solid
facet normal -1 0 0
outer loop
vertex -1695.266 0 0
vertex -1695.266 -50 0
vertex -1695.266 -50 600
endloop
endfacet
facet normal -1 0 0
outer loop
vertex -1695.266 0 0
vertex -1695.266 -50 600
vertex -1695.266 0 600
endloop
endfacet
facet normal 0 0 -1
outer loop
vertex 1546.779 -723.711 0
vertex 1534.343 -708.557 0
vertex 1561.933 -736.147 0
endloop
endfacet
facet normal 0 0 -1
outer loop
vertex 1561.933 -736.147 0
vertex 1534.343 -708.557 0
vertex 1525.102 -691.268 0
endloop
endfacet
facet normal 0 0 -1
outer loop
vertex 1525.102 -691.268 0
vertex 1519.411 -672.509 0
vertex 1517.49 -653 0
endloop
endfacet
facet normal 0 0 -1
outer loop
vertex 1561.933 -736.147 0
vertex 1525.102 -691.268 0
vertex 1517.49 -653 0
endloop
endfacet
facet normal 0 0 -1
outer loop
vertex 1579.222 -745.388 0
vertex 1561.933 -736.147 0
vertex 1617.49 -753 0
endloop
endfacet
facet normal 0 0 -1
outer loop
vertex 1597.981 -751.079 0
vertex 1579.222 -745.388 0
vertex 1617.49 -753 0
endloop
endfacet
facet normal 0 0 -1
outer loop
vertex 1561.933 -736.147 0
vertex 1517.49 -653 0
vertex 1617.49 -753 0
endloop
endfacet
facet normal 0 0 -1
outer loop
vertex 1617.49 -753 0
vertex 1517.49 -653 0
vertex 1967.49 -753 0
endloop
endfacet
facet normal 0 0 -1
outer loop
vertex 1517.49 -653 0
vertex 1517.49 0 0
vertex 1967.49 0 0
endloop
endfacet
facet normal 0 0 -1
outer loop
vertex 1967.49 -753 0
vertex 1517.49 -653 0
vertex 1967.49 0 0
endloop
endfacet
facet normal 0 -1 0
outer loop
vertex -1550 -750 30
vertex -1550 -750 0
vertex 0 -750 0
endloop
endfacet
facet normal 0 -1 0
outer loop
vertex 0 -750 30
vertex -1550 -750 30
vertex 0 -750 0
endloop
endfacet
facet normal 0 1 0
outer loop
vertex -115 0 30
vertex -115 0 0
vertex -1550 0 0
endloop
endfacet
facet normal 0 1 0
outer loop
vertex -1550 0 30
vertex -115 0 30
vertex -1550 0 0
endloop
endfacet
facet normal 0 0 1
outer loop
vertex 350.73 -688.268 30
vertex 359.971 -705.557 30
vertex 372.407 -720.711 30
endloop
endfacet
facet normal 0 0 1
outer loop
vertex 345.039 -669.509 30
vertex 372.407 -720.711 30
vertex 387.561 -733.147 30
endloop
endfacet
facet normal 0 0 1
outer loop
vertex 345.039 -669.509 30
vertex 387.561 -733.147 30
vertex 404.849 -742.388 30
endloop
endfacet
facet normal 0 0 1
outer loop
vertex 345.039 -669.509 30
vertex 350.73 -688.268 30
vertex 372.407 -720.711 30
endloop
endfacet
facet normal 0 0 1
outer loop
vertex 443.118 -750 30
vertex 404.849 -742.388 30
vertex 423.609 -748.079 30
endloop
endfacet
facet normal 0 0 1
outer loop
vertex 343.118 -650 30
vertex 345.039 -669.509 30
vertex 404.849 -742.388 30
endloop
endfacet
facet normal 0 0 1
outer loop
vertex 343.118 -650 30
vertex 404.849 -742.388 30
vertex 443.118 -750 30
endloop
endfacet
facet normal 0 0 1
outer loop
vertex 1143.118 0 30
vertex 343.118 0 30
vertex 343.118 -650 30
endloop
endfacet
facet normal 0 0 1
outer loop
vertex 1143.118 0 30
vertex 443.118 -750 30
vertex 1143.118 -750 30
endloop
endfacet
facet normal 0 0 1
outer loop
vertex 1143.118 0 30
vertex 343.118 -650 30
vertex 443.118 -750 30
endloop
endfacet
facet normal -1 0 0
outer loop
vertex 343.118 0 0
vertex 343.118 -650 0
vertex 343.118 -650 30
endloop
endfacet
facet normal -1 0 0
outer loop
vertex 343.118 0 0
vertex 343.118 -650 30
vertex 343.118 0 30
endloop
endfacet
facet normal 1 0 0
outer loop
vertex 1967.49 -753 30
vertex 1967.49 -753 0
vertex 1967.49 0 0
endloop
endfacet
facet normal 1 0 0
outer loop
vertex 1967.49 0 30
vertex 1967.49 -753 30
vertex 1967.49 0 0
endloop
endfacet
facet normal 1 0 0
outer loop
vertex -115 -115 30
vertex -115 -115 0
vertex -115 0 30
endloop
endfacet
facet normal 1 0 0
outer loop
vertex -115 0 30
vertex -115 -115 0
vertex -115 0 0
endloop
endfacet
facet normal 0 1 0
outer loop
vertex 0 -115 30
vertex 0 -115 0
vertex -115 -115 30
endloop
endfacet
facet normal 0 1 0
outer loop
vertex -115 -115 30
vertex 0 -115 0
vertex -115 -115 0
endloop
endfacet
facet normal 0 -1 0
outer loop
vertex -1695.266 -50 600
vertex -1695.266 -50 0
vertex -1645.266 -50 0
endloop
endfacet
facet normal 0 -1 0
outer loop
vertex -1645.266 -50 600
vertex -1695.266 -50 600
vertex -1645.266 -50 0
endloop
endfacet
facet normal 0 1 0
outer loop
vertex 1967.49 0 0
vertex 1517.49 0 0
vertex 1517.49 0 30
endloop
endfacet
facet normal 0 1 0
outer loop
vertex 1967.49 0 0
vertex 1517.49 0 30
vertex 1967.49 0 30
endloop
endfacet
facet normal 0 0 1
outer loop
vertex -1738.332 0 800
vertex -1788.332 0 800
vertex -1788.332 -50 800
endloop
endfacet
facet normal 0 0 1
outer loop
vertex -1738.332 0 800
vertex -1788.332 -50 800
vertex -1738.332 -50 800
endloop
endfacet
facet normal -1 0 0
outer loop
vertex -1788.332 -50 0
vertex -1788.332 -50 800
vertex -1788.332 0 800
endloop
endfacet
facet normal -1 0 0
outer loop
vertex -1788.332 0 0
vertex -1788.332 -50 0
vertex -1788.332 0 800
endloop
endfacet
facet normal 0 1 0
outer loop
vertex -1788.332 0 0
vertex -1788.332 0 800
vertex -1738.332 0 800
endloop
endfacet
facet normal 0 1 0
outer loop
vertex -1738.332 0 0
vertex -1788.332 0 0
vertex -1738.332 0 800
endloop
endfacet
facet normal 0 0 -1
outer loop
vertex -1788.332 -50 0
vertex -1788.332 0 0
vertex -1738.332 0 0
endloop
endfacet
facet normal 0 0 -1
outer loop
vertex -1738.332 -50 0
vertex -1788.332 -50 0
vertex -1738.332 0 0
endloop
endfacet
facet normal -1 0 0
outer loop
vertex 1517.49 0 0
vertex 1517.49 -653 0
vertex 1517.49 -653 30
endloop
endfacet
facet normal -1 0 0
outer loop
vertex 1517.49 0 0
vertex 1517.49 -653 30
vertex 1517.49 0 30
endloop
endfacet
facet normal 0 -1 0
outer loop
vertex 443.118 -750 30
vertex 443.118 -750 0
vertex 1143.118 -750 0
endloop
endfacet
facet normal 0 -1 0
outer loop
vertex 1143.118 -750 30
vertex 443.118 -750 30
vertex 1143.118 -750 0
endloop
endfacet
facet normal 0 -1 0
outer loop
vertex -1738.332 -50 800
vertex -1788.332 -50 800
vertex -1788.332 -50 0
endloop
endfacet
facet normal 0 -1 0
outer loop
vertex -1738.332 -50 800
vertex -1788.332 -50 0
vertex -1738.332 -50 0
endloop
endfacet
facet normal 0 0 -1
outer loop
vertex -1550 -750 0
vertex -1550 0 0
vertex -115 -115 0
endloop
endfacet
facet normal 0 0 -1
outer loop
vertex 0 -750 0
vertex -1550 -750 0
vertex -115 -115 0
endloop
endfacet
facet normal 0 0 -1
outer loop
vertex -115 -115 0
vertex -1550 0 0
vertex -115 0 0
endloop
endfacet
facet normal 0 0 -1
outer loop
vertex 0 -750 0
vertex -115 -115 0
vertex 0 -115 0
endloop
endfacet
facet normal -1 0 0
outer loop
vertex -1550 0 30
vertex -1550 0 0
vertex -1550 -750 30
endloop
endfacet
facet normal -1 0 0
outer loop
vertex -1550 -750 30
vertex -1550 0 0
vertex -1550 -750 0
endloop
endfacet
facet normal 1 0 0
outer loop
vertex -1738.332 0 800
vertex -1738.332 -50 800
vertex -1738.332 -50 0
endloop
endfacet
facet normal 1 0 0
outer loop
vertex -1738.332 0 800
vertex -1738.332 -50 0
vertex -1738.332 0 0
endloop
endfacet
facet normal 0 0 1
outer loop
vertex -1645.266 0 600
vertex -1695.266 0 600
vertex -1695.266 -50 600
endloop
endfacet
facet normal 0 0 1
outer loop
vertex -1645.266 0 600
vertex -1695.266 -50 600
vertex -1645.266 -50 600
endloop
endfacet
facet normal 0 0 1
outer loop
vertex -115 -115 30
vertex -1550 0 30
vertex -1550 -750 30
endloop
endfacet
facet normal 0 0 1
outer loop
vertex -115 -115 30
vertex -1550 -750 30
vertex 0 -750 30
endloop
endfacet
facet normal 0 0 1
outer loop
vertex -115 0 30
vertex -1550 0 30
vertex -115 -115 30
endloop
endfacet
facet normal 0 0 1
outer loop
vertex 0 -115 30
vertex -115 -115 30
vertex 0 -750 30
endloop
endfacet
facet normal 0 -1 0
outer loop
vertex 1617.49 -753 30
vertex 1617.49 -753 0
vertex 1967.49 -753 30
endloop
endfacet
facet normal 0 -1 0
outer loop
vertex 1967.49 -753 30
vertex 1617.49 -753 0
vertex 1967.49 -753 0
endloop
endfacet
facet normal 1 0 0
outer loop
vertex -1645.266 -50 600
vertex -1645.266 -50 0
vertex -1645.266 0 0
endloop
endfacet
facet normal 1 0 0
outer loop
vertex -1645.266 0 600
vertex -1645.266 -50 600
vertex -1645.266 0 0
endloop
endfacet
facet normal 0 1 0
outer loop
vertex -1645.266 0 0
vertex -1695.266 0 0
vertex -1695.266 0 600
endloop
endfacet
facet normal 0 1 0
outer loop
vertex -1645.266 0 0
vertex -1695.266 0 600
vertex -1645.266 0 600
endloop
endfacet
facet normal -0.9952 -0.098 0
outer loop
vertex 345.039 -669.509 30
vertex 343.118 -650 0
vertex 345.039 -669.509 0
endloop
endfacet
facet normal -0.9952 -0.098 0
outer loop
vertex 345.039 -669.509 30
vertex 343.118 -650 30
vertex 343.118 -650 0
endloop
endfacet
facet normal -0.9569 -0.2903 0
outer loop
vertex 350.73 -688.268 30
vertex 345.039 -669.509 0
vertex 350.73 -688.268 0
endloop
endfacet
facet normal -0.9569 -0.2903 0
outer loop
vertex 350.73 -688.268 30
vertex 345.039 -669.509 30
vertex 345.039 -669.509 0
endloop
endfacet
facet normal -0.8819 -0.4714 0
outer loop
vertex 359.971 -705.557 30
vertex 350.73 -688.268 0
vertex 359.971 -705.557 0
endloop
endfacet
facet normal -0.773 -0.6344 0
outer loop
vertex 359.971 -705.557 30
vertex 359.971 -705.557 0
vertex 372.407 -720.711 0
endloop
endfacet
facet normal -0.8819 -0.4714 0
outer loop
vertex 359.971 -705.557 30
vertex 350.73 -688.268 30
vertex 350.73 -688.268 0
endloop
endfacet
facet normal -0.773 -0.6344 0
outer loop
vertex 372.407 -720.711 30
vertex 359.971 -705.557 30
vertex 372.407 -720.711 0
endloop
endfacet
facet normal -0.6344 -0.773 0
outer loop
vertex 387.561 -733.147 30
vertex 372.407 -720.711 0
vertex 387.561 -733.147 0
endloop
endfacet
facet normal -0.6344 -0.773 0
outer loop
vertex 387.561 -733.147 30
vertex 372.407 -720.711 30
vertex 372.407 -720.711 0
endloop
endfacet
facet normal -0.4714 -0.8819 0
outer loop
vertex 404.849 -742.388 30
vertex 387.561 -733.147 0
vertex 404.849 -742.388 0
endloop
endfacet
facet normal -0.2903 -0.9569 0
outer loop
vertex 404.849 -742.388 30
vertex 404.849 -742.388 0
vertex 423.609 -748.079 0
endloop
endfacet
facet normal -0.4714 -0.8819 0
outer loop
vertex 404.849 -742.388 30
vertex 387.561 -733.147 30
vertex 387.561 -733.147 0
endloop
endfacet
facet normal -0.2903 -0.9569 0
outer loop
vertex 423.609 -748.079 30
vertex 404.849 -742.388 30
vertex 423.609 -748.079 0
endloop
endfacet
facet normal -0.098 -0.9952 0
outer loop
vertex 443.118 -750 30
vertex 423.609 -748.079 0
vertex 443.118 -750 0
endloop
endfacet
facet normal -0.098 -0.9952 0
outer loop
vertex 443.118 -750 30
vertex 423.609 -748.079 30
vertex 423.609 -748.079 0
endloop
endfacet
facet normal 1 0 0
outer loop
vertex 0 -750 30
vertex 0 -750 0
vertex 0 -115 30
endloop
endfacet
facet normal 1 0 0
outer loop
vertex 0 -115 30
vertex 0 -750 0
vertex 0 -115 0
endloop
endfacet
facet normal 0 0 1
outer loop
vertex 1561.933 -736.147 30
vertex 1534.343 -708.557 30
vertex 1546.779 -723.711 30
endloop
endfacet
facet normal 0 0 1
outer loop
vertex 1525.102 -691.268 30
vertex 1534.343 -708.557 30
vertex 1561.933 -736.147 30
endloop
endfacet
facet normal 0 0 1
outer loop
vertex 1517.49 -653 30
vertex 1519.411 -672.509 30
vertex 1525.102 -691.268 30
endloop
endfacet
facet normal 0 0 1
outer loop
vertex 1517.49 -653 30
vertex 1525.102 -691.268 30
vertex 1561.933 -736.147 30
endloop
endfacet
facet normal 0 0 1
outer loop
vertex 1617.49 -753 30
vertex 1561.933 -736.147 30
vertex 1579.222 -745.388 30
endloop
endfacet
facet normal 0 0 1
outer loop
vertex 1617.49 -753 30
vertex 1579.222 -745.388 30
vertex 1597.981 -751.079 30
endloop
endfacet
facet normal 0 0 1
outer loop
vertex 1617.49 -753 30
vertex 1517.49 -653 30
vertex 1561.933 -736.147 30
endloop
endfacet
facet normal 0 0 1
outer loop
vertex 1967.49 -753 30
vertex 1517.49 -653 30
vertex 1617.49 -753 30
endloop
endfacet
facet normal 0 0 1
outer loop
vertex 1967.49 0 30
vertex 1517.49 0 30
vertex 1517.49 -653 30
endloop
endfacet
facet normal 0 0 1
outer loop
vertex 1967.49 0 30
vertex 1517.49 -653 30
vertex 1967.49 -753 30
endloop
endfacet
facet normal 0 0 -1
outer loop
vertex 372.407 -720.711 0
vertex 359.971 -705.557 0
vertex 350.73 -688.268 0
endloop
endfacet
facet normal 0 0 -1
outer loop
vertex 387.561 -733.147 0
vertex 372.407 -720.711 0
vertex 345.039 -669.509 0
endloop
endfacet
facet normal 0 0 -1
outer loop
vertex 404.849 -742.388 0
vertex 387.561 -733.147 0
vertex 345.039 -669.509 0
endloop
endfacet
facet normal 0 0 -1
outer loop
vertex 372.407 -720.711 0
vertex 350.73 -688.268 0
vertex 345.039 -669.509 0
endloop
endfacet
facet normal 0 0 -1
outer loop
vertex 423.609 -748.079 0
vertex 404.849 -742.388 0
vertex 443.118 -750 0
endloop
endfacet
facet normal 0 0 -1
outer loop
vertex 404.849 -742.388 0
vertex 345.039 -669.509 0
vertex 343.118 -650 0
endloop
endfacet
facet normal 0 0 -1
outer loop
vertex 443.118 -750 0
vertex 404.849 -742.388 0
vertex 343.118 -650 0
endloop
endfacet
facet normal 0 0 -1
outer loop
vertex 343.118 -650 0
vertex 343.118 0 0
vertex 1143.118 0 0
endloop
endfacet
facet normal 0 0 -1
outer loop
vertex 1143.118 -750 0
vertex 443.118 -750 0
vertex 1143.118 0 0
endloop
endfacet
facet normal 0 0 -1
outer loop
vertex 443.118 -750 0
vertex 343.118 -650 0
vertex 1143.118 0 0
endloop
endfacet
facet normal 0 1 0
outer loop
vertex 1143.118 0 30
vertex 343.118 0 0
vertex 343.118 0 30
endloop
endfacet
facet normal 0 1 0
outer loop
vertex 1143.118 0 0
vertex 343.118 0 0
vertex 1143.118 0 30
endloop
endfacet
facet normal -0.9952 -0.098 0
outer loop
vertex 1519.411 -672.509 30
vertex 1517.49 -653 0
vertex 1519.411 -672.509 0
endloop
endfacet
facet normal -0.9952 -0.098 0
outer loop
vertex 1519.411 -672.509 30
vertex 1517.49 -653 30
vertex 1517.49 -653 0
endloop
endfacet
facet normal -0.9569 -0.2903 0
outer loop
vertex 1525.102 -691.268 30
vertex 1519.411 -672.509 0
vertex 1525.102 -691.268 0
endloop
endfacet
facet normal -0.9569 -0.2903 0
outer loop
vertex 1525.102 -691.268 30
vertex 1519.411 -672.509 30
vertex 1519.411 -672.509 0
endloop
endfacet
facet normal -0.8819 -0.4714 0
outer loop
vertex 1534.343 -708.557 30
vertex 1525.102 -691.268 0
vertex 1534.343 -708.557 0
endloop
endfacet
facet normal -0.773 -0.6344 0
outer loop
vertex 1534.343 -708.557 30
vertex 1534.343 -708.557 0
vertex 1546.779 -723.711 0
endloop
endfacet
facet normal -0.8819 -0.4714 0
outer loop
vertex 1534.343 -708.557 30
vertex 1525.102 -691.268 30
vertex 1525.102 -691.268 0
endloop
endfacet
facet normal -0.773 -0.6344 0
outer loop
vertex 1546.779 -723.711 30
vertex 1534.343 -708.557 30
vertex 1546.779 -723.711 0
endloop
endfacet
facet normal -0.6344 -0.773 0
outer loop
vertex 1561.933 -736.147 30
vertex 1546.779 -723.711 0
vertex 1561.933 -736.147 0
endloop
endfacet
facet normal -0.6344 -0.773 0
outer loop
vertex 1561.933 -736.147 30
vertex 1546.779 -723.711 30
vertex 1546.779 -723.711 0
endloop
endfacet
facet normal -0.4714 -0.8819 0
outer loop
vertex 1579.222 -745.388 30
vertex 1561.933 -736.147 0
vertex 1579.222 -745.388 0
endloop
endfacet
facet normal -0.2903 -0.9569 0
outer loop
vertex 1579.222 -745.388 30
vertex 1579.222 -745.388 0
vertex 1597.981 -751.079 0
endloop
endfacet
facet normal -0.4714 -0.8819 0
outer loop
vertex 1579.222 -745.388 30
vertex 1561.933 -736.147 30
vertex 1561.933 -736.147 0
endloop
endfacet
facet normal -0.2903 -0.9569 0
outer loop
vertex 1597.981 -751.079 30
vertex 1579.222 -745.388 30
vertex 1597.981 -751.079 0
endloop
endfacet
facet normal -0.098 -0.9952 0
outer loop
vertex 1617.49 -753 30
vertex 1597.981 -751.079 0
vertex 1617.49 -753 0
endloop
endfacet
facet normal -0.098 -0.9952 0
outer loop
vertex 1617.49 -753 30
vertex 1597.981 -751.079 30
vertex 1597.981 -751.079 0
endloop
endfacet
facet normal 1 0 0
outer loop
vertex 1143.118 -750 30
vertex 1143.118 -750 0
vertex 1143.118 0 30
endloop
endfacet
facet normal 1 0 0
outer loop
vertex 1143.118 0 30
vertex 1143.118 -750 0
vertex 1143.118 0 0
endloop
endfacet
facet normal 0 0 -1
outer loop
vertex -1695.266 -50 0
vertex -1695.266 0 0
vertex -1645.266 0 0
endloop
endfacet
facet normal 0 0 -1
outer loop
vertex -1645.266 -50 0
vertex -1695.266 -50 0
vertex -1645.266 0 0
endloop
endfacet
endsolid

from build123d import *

# Parameters (mm, degrees)
F1_W     = 800
F1_H     = 750
F2_DEPTH = 30
F3_R     = 100
F4_W     = 50
F4_H     = 50
F5_DEPTH = 800
F6_W     = 50
F6_H     = 50
F7_DEPTH = 600
F8_W     = 450
F8_H     = 753
F9_DEPTH = 30
F10_R    = 100


with BuildPart() as f2:
    # F1 (on Top) + F0 (on Top) → F2 (new body)
    with BuildSketch(Plane.XY):
        with Locations((743.117574, -375)):
            Rectangle(F1_W, F1_H)
    with BuildSketch(Plane.XY):
        Polygon((-115, -115), (-115, 0), (-1550, 0), (-1550, -750), (0, -750), (0, -115), align=None)
    extrude(amount=F2_DEPTH)

    # F3
    f3_edges = [f2.edges().sort_by_distance(p)[0] for p in [
        (343.117574, -750, 15),
    ]]
    fillet(f3_edges, radius=F3_R)


with BuildPart() as f5:
    # F4 (on Top) → F5 (new body)
    with BuildSketch(Plane.XY):
        with Locations((-1763.33228, -25)):
            Rectangle(F4_W, F4_H)
    extrude(amount=F5_DEPTH)


with BuildPart() as f7:
    # F6 (on Top) → F7 (new body)
    with BuildSketch(Plane.XY):
        with Locations((-1670.265808, -25)):
            Rectangle(F6_W, F6_H)
    extrude(amount=F7_DEPTH)


with BuildPart() as f9:
    # F8 (on Top) → F9 (new body)
    with BuildSketch(Plane.XY):
        with Locations((1742.489915, -376.5)):
            Rectangle(F8_W, F8_H)
    extrude(amount=F9_DEPTH)

    # F10
    f10_edges = [f9.edges().sort_by_distance(p)[0] for p in [
        (1517.489915, -753, 15),
    ]]
    fillet(f10_edges, radius=F10_R)


solid = Compound([f2.part, f5.part, f7.part, f9.part])
